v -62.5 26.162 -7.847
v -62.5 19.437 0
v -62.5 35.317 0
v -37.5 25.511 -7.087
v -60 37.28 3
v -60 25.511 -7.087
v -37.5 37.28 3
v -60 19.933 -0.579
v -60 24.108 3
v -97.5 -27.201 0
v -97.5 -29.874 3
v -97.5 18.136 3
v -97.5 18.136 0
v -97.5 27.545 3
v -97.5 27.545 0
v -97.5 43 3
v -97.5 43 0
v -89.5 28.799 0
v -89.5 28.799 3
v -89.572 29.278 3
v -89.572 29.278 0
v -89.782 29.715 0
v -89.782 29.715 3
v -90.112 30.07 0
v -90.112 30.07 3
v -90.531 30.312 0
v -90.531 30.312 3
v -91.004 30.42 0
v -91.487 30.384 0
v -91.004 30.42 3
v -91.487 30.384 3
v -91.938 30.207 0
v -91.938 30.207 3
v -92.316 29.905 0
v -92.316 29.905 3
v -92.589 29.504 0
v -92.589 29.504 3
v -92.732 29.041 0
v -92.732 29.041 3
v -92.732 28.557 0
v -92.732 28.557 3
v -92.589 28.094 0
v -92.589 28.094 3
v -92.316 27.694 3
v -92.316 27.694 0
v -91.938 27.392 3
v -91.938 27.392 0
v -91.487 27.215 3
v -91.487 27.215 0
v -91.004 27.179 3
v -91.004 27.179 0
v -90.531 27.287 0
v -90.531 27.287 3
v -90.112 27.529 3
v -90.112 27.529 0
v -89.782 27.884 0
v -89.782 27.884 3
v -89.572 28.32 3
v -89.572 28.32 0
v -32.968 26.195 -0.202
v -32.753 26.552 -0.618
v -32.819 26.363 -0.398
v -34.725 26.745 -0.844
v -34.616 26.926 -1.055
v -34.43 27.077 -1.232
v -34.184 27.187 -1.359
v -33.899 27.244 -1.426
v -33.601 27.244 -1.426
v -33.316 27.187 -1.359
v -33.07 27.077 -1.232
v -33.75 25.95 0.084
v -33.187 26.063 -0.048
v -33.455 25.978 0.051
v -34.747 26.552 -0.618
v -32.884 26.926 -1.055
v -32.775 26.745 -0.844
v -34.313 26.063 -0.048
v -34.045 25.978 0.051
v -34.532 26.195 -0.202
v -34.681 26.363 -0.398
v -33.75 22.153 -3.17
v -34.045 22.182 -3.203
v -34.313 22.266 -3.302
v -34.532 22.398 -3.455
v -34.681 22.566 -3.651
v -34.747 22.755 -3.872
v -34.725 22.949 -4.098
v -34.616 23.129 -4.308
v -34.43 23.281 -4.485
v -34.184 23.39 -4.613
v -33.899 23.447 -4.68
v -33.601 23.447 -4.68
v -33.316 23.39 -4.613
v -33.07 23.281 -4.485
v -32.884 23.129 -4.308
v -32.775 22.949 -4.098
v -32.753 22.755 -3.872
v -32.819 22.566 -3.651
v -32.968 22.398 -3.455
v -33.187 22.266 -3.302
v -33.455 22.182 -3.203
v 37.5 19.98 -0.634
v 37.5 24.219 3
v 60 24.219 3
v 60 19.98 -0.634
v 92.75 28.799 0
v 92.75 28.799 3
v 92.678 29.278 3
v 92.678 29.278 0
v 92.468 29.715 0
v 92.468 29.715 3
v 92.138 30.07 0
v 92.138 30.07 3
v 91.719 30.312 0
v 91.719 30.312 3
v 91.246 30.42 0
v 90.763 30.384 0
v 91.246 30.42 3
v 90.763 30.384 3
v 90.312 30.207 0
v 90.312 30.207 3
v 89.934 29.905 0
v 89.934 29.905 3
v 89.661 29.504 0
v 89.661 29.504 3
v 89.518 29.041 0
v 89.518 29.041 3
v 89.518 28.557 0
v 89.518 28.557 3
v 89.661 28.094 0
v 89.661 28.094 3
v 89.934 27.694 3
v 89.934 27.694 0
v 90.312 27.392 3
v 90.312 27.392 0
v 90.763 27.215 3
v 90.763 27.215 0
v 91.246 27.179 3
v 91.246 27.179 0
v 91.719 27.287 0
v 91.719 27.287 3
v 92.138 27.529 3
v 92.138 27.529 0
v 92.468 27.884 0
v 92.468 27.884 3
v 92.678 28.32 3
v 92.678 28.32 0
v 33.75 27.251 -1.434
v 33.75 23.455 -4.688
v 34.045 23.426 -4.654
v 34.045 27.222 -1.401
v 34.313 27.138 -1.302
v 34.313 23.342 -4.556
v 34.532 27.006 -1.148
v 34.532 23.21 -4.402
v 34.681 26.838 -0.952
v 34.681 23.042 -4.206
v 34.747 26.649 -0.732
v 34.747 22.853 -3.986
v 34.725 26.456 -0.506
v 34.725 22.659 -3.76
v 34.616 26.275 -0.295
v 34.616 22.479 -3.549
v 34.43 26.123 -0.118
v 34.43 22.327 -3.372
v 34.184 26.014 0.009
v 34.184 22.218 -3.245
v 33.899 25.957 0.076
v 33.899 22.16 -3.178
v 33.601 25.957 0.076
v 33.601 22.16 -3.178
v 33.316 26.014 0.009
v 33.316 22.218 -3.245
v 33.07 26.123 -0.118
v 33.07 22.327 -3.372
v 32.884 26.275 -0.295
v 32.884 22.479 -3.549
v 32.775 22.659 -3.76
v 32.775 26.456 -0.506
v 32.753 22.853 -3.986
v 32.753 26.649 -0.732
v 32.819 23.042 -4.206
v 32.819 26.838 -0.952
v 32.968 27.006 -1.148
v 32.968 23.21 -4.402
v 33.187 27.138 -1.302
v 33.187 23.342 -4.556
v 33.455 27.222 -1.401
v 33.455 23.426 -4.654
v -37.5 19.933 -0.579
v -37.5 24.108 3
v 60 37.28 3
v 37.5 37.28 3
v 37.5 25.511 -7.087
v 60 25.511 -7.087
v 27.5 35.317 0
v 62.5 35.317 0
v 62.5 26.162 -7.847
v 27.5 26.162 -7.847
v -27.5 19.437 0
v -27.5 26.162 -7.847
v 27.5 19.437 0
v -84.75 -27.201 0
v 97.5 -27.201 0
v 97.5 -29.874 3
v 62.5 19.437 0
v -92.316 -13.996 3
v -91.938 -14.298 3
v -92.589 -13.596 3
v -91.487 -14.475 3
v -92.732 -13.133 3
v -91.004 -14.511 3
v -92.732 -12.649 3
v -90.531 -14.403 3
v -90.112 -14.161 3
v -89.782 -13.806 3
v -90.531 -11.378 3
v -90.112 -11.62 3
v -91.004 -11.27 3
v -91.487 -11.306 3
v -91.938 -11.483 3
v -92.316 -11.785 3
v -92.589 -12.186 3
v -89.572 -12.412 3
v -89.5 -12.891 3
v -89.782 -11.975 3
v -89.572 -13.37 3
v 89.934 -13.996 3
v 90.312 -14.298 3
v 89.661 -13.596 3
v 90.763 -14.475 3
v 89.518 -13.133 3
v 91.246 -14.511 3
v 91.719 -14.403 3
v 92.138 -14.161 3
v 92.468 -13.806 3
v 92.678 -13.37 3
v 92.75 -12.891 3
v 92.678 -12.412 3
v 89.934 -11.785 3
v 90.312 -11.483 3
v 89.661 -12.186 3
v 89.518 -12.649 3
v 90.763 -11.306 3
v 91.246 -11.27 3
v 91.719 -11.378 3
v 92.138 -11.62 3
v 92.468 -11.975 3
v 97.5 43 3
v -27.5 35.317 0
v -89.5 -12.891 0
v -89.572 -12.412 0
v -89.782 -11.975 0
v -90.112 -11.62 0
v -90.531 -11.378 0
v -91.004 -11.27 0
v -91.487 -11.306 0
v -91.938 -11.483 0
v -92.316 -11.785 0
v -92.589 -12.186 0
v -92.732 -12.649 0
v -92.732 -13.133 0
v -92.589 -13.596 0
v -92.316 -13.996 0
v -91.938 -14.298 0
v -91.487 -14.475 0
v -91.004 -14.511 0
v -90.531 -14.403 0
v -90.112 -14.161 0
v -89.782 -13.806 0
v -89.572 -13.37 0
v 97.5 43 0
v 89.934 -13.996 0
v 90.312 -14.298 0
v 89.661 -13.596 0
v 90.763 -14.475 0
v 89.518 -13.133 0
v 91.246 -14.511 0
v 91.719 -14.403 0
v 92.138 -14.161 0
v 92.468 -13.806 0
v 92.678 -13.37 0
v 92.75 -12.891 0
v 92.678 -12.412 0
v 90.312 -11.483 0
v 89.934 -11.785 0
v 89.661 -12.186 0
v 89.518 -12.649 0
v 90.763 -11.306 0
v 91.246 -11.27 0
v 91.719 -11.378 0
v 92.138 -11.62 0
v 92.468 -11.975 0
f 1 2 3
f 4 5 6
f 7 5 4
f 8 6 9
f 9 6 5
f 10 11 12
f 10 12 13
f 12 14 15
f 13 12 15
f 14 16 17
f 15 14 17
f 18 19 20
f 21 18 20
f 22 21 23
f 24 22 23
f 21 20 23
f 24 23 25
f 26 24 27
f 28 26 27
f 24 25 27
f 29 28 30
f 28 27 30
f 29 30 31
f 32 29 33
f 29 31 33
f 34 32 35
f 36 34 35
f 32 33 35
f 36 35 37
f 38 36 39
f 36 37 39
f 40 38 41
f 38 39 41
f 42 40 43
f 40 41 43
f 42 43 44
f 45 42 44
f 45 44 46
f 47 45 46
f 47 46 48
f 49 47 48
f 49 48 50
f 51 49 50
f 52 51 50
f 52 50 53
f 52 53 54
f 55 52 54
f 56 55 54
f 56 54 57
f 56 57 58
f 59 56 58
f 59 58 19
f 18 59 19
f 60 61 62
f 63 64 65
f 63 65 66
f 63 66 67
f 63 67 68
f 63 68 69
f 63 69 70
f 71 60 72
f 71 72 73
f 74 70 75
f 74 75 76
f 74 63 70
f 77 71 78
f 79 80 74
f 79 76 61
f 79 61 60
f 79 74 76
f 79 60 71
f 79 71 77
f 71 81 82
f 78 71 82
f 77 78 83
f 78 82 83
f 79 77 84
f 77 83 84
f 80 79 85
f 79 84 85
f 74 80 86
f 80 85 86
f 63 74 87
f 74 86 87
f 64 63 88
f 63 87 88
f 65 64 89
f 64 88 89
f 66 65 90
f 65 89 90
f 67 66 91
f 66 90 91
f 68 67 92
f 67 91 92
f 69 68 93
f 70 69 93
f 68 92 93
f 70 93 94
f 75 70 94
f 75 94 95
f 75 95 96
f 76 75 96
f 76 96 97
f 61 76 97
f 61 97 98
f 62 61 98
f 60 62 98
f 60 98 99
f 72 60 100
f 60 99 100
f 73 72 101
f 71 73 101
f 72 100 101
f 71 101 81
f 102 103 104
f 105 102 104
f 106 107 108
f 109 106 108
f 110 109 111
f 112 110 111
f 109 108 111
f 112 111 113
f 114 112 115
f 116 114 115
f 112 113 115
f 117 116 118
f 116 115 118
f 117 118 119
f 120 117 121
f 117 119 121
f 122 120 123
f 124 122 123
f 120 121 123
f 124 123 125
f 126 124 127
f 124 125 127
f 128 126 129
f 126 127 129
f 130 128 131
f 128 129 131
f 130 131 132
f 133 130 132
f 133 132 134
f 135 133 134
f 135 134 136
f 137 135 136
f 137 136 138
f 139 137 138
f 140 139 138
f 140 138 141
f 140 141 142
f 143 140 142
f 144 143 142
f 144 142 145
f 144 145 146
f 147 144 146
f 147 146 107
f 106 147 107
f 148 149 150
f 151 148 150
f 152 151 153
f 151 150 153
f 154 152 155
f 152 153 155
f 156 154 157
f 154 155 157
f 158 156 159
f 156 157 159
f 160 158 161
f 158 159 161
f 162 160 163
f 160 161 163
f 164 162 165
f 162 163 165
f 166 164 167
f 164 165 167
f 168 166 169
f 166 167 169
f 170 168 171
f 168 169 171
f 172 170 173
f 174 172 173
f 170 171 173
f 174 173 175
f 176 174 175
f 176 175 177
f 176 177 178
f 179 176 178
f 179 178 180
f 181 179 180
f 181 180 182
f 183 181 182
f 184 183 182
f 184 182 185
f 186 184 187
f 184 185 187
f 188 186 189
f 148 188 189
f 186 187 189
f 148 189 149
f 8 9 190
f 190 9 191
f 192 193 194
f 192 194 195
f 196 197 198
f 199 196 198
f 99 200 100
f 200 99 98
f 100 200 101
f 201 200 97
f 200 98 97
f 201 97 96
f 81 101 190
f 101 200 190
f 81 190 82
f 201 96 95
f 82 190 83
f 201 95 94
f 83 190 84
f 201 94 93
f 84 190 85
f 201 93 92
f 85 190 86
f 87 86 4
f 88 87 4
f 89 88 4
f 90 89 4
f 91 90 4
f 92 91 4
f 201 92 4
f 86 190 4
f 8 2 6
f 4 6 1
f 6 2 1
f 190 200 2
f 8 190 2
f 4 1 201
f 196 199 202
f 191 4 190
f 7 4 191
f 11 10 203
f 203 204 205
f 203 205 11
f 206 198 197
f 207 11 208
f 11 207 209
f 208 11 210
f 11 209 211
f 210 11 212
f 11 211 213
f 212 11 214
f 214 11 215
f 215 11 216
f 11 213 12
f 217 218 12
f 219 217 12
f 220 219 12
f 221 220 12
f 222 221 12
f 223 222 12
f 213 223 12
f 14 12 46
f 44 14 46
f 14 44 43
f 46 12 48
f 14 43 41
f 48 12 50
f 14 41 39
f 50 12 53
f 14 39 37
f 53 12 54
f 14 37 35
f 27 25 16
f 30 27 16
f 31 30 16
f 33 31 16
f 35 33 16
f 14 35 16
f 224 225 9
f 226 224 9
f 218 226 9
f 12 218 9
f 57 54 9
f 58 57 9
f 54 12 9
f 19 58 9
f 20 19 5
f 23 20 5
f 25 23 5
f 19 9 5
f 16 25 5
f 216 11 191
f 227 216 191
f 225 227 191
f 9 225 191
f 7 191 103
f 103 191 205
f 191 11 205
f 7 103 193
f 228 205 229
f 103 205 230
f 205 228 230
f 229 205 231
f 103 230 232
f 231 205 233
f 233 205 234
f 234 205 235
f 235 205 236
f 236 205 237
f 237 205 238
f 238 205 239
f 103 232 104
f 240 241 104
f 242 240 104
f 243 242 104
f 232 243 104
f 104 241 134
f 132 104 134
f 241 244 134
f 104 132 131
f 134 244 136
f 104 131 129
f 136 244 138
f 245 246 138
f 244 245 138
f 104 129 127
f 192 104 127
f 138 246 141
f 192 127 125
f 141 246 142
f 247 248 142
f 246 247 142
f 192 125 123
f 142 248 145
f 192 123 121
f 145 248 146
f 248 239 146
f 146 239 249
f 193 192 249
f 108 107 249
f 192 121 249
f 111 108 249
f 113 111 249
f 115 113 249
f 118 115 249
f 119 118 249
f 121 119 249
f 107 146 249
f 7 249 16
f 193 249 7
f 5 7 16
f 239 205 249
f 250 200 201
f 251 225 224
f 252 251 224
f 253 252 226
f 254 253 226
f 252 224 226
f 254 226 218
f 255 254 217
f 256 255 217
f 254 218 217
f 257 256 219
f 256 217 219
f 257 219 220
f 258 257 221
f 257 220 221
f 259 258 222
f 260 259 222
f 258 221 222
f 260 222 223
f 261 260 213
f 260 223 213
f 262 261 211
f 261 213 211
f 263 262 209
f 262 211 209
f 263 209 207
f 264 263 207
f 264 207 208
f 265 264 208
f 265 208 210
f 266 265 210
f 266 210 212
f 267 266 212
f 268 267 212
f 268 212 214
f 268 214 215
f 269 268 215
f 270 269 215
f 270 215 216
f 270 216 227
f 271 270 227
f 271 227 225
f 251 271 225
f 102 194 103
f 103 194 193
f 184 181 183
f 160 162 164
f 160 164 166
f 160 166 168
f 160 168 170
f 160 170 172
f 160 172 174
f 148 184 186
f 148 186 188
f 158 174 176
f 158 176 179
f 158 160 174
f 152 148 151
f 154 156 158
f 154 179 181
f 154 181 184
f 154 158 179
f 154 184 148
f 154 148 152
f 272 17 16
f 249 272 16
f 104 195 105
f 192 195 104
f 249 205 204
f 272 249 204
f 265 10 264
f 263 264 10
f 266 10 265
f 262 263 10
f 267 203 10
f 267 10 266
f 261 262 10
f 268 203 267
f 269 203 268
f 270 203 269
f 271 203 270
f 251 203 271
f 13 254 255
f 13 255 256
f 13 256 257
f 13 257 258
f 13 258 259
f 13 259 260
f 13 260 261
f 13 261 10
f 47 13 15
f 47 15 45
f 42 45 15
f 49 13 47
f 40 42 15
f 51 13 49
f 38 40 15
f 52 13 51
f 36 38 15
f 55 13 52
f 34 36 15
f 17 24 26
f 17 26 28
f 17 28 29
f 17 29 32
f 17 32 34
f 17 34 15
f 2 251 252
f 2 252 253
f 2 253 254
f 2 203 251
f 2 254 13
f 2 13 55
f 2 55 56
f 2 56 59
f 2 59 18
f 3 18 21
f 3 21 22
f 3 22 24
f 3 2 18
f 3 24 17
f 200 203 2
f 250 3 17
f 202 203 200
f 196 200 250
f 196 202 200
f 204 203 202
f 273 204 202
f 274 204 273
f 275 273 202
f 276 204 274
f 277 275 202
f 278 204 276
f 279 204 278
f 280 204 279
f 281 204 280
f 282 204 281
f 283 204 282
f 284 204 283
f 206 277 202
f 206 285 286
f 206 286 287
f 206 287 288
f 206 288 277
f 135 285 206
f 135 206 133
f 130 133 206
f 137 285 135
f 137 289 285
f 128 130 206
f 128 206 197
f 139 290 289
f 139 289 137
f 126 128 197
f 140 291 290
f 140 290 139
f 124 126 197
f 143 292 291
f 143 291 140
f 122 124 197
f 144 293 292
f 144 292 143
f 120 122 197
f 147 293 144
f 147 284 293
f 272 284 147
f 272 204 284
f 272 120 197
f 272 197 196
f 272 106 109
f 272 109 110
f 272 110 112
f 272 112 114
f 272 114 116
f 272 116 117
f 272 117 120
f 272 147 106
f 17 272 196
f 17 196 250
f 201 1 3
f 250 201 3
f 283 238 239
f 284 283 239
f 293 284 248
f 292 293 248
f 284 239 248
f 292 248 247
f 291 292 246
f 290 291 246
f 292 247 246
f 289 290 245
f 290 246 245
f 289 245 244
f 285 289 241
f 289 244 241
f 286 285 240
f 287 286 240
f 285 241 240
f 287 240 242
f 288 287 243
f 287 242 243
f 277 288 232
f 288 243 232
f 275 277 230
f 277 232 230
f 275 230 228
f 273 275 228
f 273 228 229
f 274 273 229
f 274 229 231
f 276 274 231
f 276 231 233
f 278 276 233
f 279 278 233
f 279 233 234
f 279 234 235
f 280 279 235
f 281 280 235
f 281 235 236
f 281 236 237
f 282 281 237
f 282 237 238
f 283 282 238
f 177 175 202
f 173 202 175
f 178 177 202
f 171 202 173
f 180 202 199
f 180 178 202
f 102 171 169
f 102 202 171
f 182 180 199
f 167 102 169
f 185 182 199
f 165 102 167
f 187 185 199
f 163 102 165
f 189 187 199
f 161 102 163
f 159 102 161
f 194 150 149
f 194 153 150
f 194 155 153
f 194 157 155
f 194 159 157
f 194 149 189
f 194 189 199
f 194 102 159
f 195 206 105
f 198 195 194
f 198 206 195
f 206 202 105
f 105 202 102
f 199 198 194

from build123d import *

# Parameters (mm, degrees)
CROQUIS1_W                  = 195
CROQUIS1_H                  = 38
CROQUIS1_R                  = 1.625
SALIENTE_EXTRUIR1_DEPTH     = 3
CROQUIS8_W                  = 195
CROQUIS8_H                  = 3
SALIENTE_EXTRUIR5_DEPTH     = 5
CROQUIS9_W                  = 195
CROQUIS9_H                  = 3
SALIENTE_EXTRUIR6_DEPTH     = 5
SALIENTE_EXTRUIR7_START     = -35
SALIENTE_EXTRUIR7_DEPTH     = 35
CORTAR_EXTRUIR4_DEPTH       = 106.249773968
CORTAR_EXTRUIR4_DEPTH_BACK  = 106.249773968
CROQUIS11_W                 = 22.5
CROQUIS11_H                 = 8.5
CORTAR_EXTRUIR5_REACH       = 168.049
CROQUIS13_R                 = 1
CORTAR_EXTRUIR6_DEPTH       = 5
SALIENTE_EXTRUIR8_START     = -35
SALIENTE_EXTRUIR8_DEPTH     = 35
CORTAR_EXTRUIR7_DEPTH       = 105.027363957
CORTAR_EXTRUIR7_DEPTH_BACK  = 105.027363957
CROQUIS16_W                 = 22.5
CROQUIS16_H                 = 8.572274099
CROQUIS17_R                 = 1
CORTAR_EXTRUIR8_DEPTH       = 5
CROQUIS18_R                 = 1.625
CORTAR_EXTRUIR9_DEPTH       = 10
CROQUIS19_W                 = 195
CROQUIS19_H                 = 24
SALIENTE_EXTRUIR9_DEPTH     = 3
CROQUIS20_W                 = 195
CROQUIS20_H                 = 28.69
SALIENTE_EXTRUIR10_DEPTH    = 3
CROQUIS22_W                 = 195
CROQUIS22_H                 = 8.799275258
CROQUIS22_W_2               = 10.817472397
CROQUIS22_H_2               = 9.408992843
CROQUIS22_W_3               = 11.057059306
SALIENTE_EXTRUIR11_DEPTH    = 3
CROQUIS23_R                 = 1.625
CORTAR_EXTRUIR10_DEPTH      = 10
CORTAR_EXTRUIR11_DEPTH      = 202.915168907
CORTAR_EXTRUIR11_DEPTH_BACK = 202.915168907
CROQUIS25_W                 = 6.04831912
CROQUIS25_H                 = 14.575165693
SALIENTE_EXTRUIR12_START    = -65
SALIENTE_EXTRUIR12_DEPTH    = 65
SALIENTE_EXTRUIR15_DEPTH    = 12.75
SALIENTE_EXTRUIR16_DEPTH    = 12.75
CROQUIS27_W                 = 3
CROQUIS27_H                 = 30
SALIENTE_EXTRUIR13_DEPTH    = 195
SALIENTE_EXTRUIR14_DEPTH    = 195
CORTAR_EXTRUIR12_DEPTH      = 127.00662353
CORTAR_EXTRUIR12_DEPTH_BACK = 127.00662353
CROQUIS31_R                 = 1.625
SALIENTE_EXTRUIR17_DEPTH    = 12.75
SALIENTE_EXTRUIR18_DEPTH    = 12.75
CORTAR_EXTRUIR15_DEPTH      = 125.603100021
CORTAR_EXTRUIR15_DEPTH_BACK = 125.603100021
CROQUIS39_R                 = 1.625
CORTAR_EXTRUIR16_START      = -4
CROQUIS40_R                 = 4
CORTAR_EXTRUIR16_DEPTH      = 121.603100021
SALIENTE_EXTRUIR19_START    = -15
SALIENTE_EXTRUIR19_DEPTH    = 4
CHAFL_N1_SIZE               = 10
CORTAR_EXTRUIR17_DEPTH      = 213.001339527
CORTAR_EXTRUIR17_DEPTH_BACK = 213.001339527
CROQUIS45_W                 = 3
CROQUIS45_H                 = 8.799275258
CORTAR_EXTRUIR18_DEPTH      = 202.915168907


with BuildPart() as part:
    # Croquis1 → Saliente-Extruir1 (new body)
    with BuildSketch(Plane.XY):
        with Locations((0, 19)):
            Rectangle(CROQUIS1_W, CROQUIS1_H)
        with Locations((91.125, 15)):
            Circle(CROQUIS1_R, mode=Mode.SUBTRACT)
        with Locations(Location((-91.125, 15, 0), (0, 0, 180))):
            Circle(CROQUIS1_R, mode=Mode.SUBTRACT)
    extrude(amount=SALIENTE_EXTRUIR1_DEPTH)

    # Croquis8 → Saliente-Extruir5 (add)
    with BuildSketch(Plane.XZ):
        with Locations((0, 1.5)):
            Rectangle(CROQUIS8_W, CROQUIS8_H)
    extrude(amount=SALIENTE_EXTRUIR5_DEPTH)

    # Croquis9 → Saliente-Extruir6 (add)
    with BuildSketch(Plane(origin=(0, 38, 0), x_dir=(1, 0, 0), z_dir=(0, 1, 0))):
        with Locations((0, -1.5)):
            Rectangle(CROQUIS9_W, CROQUIS9_H)
    extrude(amount=SALIENTE_EXTRUIR6_DEPTH)

    # Croquis10 → Saliente-Extruir7 (add)
    with BuildSketch(Plane(origin=(97.5, 0, 0), x_dir=(0, 0, -1), z_dir=(1, 0, 0)).offset(SALIENTE_EXTRUIR7_START)):
        Polygon((0, 35.316843742), (11.100559408, 22.365598856), (1.230032412, 13.905534031), (0, 12.851268747), align=None)
    extrude(amount=-SALIENTE_EXTRUIR7_DEPTH)

    # Croquis11 → Cortar-Extruir4 (cut, two sides: drawn at the far end of the back side and taken through both)
    with BuildSketch(Plane(origin=(0, 7.408665422, 6.349994257), x_dir=(1, 0, 0), z_dir=(0, -0.7592713073348797, -0.6507742172658522)).offset(-CORTAR_EXTRUIR4_DEPTH_BACK)):
        with Locations((48.75, -17.733291342)):
            Rectangle(CROQUIS11_W, CROQUIS11_H)
    extrude(amount=CORTAR_EXTRUIR4_DEPTH + CORTAR_EXTRUIR4_DEPTH_BACK, mode=Mode.SUBTRACT)

    # Croquis12 → Cortar-Extruir5 (cut, up to next)
    with BuildSketch(Plane(origin=(62.5, 0, 0), x_dir=(0, 0, -1), z_dir=(1, 0, 0)), mode=Mode.PRIVATE) as cortar_extruir5_sk1:
        Polygon((11.100559408, 22.365598856), (0, 12.851268747), (0, 19.436530105), (7.846688321, 26.161955392), align=None)
    cortar_extruir5_tool1 = extrude(cortar_extruir5_sk1.sketch, amount=-CORTAR_EXTRUIR5_REACH, mode=Mode.PRIVATE) & part.part
    add(cortar_extruir5_tool1.solids().sort_by_distance((62.5, 20.055266, -4.783378))[0], mode=Mode.SUBTRACT)

    # Croquis13 → Cortar-Extruir6 (cut)
    with BuildSketch(Plane(origin=(0, 11.205021959, 9.603865343), x_dir=(1, 0, 0), z_dir=(0, -0.7592713073348788, -0.6507742172658535))):
        with Locations(Location((33.75, -17.823291342, 0), (0, 0, 270))):
            Circle(CROQUIS13_R)
    extrude(amount=-CORTAR_EXTRUIR6_DEPTH, mode=Mode.SUBTRACT)

    # Croquis14 → Saliente-Extruir8 (add)
    with BuildSketch(Plane.ZY.offset(97.5).offset(SALIENTE_EXTRUIR8_START)):
        Polygon((0, 19.436530105), (-7.846688321, 26.161955392), (0, 35.316843742), align=None)
    extrude(amount=-SALIENTE_EXTRUIR8_DEPTH)

    # Croquis16 → Cortar-Extruir7 (cut, two sides: drawn at the far end of the back side and taken through both)
    with BuildSketch(Plane(origin=(0, 11.205021959, 9.603865343), x_dir=(1, 0, 0), z_dir=(0, -0.7592713073348788, -0.6507742172658535)).offset(-CORTAR_EXTRUIR7_DEPTH_BACK)):
        with Locations((-48.75, -17.697154293)):
            Rectangle(CROQUIS16_W, CROQUIS16_H)
    extrude(amount=CORTAR_EXTRUIR7_DEPTH + CORTAR_EXTRUIR7_DEPTH_BACK, mode=Mode.SUBTRACT)

    # Croquis17 → Cortar-Extruir8 (cut)
    with BuildSketch(Plane(origin=(0, 11.205021959, 9.603865343), x_dir=(1, 0, 0), z_dir=(0, -0.7592713073348788, -0.6507742172658535))):
        with Locations(Location((-33.75, -17.823291342, 0), (0, 0, 90))):
            Circle(CROQUIS17_R)
    extrude(amount=-CORTAR_EXTRUIR8_DEPTH, mode=Mode.SUBTRACT)

    # Croquis18 → Cortar-Extruir9 (cut)
    with BuildSketch(Plane.XY.offset(3)):
        with Locations((91.125, 23)):
            Circle(CROQUIS18_R)
        with Locations((-91.125, 23)):
            Circle(CROQUIS18_R)
    extrude(amount=-CORTAR_EXTRUIR9_DEPTH, mode=Mode.SUBTRACT)

    # Croquis19 → Saliente-Extruir9 (add)
    with BuildSketch(Plane.XY.offset(3)):
        with Locations((0, 7)):
            Rectangle(CROQUIS19_W, CROQUIS19_H)
    extrude(amount=-SALIENTE_EXTRUIR9_DEPTH)

    # Croquis20 → Saliente-Extruir10 (add)
    with BuildSketch(Plane.XY.offset(3)):
        with Locations((0, -19.345)):
            Rectangle(CROQUIS20_W, CROQUIS20_H)
    extrude(amount=-SALIENTE_EXTRUIR10_DEPTH)

    # Croquis22 → Saliente-Extruir11 (add)
    with BuildSketch(Plane.XY.offset(3)):
        with Locations((0, 47.399637629)):
            Rectangle(CROQUIS22_W, CROQUIS22_H)
        with Locations((-92.091263802, 22.840486177)):
            Rectangle(CROQUIS22_W_2, CROQUIS22_H_2)
        with Locations((91.971470347, 22.840486177)):
            Rectangle(CROQUIS22_W_3, CROQUIS22_H_2)
    extrude(amount=-SALIENTE_EXTRUIR11_DEPTH)

    # Croquis23 → Cortar-Extruir10 (cut)
    with BuildSketch(Plane.XY.offset(3)):
        with Locations((-91.125, 28.799275258)):
            Circle(CROQUIS23_R)
        with Locations((-91.125, -12.890724742)):
            Circle(CROQUIS23_R)
        with Locations((91.125, -12.890724742)):
            Circle(CROQUIS23_R)
        with Locations((91.125, 28.799275258)):
            Circle(CROQUIS23_R)
    extrude(amount=-CORTAR_EXTRUIR10_DEPTH, mode=Mode.SUBTRACT)

    # Croquis25 → Cortar-Extruir11 (cut, two sides: drawn at the far end of the back side and taken through both)
    with BuildSketch(Plane.ZY.offset(97.5).offset(-CORTAR_EXTRUIR11_DEPTH_BACK)):
        with Locations((3.02415956, -34.488307588)):
            Rectangle(CROQUIS25_W, CROQUIS25_H)
    extrude(amount=CORTAR_EXTRUIR11_DEPTH + CORTAR_EXTRUIR11_DEPTH_BACK, mode=Mode.SUBTRACT)

    # Croquis26 → Saliente-Extruir12 (add)
    with BuildSketch(Plane(origin=(97.5, 0, 0), x_dir=(0, 0, -1), z_dir=(1, 0, 0)).offset(SALIENTE_EXTRUIR12_START)):
        Polygon((0, 51.799275258), (0, 57.17304517), (3, 57.17304517), (3, 48.799275258), (0, 44.799275258), align=None)
    extrude(amount=-SALIENTE_EXTRUIR12_DEPTH)

    # Croquis29 → Saliente-Extruir15 (add)
    with BuildSketch(Plane(origin=(97.5, 0, 0), x_dir=(0, 0, -1), z_dir=(1, 0, 0))):
        Polygon((-3, -27.200724742), (21.04761885, -55.257563071), (22.868084319, -53.697235453), (-1.179534531, -25.640397124), align=None)
    extrude(amount=-SALIENTE_EXTRUIR15_DEPTH)

    # Croquis30 → Saliente-Extruir16 (add)
    with BuildSketch(Plane.ZY.offset(97.5)):
        Polygon((0, -27.200724742), (3, -27.200724742), (-21.04761885, -55.257563071), (-22.868084319, -53.697235453), align=None)
    extrude(amount=-SALIENTE_EXTRUIR16_DEPTH)

    # Croquis27 → Saliente-Extruir13 (add)
    with BuildSketch(Plane(origin=(97.5, 0, 0), x_dir=(0, 0, -1), z_dir=(1, 0, 0))):
        with Locations((-1.5, -42.200724742)):
            Rectangle(CROQUIS27_W, CROQUIS27_H)
    extrude(amount=-SALIENTE_EXTRUIR13_DEPTH)

    # Croquis28 → Saliente-Extruir14 (add)
    with BuildSketch(Plane(origin=(97.5, 0, 0), x_dir=(0, 0, -1), z_dir=(1, 0, 0))):
        Polygon((20.723276226, -76.378985981), (0, -52.200724742), (0, -57.200724742), (-3, -57.200724742), (16.523226518, -79.978863962), align=None)
        Polygon((0, -57.200724742), (0, -52.200724742), (-3, -54.772035726), (-3, -57.200724742), align=None)
    extrude(amount=-SALIENTE_EXTRUIR14_DEPTH)

    # Croquis31 → Cortar-Extruir12 (cut, two sides: drawn at the far end of the back side and taken through both)
    with BuildSketch(Plane(origin=(0, -13.002042132, 15.169742848), x_dir=(1, 0, 0), z_dir=(0, -0.6507742172658533, 0.7592713073348789)).offset(-CORTAR_EXTRUIR12_DEPTH_BACK)):
        with Locations(Location((91.125, -37.962916807, 0), (0, 0, 270))):
            Circle(CROQUIS31_R)
        with Locations(Location((-91.125, -37.962916807, 0), (0, 0, 270))):
            Circle(CROQUIS31_R)
    extrude(amount=CORTAR_EXTRUIR12_DEPTH + CORTAR_EXTRUIR12_DEPTH_BACK, mode=Mode.SUBTRACT)

    # Croquis32 → Saliente-Extruir17 (add)
    with BuildSketch(Plane(origin=(97.5, 0, 0), x_dir=(0, 0, -1), z_dir=(1, 0, 0))):
        Polygon((0, -30.7008848), (21.04761885, -55.257563071), (10.361638113, -64.289855362), (0, -52.200724742), align=None)
    extrude(amount=-SALIENTE_EXTRUIR17_DEPTH)

    # Croquis33 → Saliente-Extruir18 (add)
    with BuildSketch(Plane.ZY.offset(97.5)):
        Polygon((0, -30.7008848), (0, -52.200724742), (-10.361638113, -64.289855362), (-21.04761885, -55.257563071), align=None)
    extrude(amount=-SALIENTE_EXTRUIR18_DEPTH)

    # Croquis39 → Cortar-Extruir15 (cut, two sides: drawn at the far end of the back side and taken through both)
    with BuildSketch(Plane(origin=(0, -11.441714514, 13.349277379), x_dir=(-1, 0, 0), z_dir=(0, 0.6507742172658534, -0.7592713073348788)).offset(-CORTAR_EXTRUIR15_DEPTH_BACK)):
        with Locations(Location((91.125, -37.962916807, 0), (0, 0, 270))):
            Circle(CROQUIS39_R)
        with Locations(Location((-91.125, -37.962916807, 0), (0, 0, 270))):
            Circle(CROQUIS39_R)
    extrude(amount=CORTAR_EXTRUIR15_DEPTH + CORTAR_EXTRUIR15_DEPTH_BACK, mode=Mode.SUBTRACT)

    # Croquis40 → Cortar-Extruir16 (cut, through all)
    with BuildSketch(Plane(origin=(0, -11.441714514, 13.349277379), x_dir=(-1, 0, 0), z_dir=(0, 0.6507742172658534, -0.7592713073348788)).offset(CORTAR_EXTRUIR16_START)):
        with Locations(Location((-91.125, -37.962916807, 0), (0, 0, 90))):
            Circle(CROQUIS40_R)
        with Locations(Location((91.125, -37.962916807, 0), (0, 0, 90))):
            Circle(CROQUIS40_R)
    extrude(amount=-CORTAR_EXTRUIR16_DEPTH, mode=Mode.SUBTRACT)

    # Croquis43 → Saliente-Extruir19 (add)
    with BuildSketch(Plane(origin=(0, -54.271609374, -46.516395087), x_dir=(1, 0, 0), z_dir=(0, -0.7592713073348788, -0.6507742172658533)).offset(SALIENTE_EXTRUIR19_START)):
        with BuildLine():
            Line((-10, 33.970885785), (10, 33.970885785))
            Line((10, 33.970885785), (10, 23.970885785))
            Line((10, 23.970885785), (3.75, 23.970885785))
            Line((3.75, 23.970885785), (3.75, 28.970885785))
            ThreePointArc((3.75, 28.970885785), (0, 32.720885785), (-3.75, 28.970885785))
            Line((-3.75, 28.970885785), (-3.75, 23.970885785))
            Line((-3.75, 23.970885785), (-10, 23.970885785))
            Line((-10, 23.970885785), (-10, 33.970885785))
        make_face()
    extrude(amount=-SALIENTE_EXTRUIR19_DEPTH)

    # Chaflán1
    chafl_n1_edges = [part.edges().sort_by_distance(p)[0] for p in [
        (-10, -63.471373756, -9.660114532),
        (10, -63.471373756, -9.660114532),
    ]]
    chamfer(chafl_n1_edges, length=CHAFL_N1_SIZE - 0.0001)  # a hair under: the kernel refuses the full size

    # Croquis44 → Cortar-Extruir17 (cut, two sides: drawn at the far end of the back side and taken through both)
    with BuildSketch(Plane.ZY.offset(97.5).offset(-CORTAR_EXTRUIR17_DEPTH_BACK)):
        Polygon((0, 51.799275258), (0, 44.799275258), (-5.496499464, 48.299275258), (-4.805550045, 58.708716301), (3.346767107, 60.185775605), align=None)
        Polygon((0, -27.200724742), (19.940439733, -44.968243133), (-20.573128604, -90.43651563), (-48.007758083, -62.518842932), (0, -27.016583675), align=None)
    extrude(amount=CORTAR_EXTRUIR17_DEPTH + CORTAR_EXTRUIR17_DEPTH_BACK, mode=Mode.SUBTRACT)

    # Croquis45 → Cortar-Extruir18 (cut, through all)
    with BuildSketch(Plane.ZY.offset(97.5)):
        with Locations((1.5, 47.399637629)):
            Rectangle(CROQUIS45_W, CROQUIS45_H)
    extrude(amount=-CORTAR_EXTRUIR18_DEPTH, mode=Mode.SUBTRACT)


solid = part.part
